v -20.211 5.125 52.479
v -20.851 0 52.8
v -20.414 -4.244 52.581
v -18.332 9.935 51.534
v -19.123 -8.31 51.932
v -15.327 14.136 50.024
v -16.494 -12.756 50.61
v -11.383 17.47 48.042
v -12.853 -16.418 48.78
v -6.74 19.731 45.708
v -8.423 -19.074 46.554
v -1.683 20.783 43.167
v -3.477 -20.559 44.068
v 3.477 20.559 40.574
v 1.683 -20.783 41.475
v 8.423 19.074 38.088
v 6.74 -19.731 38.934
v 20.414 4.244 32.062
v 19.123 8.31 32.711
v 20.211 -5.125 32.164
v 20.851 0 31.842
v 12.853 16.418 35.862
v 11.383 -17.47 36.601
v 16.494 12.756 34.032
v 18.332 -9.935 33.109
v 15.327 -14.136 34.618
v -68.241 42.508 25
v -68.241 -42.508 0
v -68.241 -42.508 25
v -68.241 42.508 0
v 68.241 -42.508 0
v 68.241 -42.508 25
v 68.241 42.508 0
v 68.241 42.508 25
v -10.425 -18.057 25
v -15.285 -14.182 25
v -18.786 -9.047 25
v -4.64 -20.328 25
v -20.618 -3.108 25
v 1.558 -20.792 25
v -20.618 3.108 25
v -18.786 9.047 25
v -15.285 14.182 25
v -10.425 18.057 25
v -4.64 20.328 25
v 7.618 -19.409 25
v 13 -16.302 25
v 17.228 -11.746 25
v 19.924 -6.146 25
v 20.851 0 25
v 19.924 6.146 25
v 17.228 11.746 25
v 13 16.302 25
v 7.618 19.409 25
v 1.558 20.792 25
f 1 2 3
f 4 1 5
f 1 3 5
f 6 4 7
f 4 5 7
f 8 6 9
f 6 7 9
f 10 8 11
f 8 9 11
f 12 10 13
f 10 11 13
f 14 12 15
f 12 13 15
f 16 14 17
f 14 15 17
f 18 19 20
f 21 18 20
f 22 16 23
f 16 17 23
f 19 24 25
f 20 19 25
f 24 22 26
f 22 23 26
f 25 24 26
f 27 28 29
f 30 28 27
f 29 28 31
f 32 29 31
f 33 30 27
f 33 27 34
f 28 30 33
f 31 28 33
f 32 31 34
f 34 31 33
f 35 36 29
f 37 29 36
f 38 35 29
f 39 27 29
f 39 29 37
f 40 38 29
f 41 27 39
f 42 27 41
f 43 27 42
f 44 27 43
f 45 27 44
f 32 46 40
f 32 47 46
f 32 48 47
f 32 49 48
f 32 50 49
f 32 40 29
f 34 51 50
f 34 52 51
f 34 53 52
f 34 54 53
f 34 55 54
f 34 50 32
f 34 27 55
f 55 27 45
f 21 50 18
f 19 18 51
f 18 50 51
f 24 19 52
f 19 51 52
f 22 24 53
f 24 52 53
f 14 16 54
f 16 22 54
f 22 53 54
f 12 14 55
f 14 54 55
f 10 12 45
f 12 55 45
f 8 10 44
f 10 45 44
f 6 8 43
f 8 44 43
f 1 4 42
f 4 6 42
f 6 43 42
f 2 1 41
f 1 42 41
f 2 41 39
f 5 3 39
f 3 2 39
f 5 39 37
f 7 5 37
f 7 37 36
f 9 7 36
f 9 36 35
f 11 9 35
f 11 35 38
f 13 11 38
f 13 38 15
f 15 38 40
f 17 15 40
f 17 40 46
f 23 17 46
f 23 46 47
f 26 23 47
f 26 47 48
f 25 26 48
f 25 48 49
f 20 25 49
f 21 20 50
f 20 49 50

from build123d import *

# Parameters (mm, degrees)
F0_W     = 136.481836
F0_H     = 85.016138
F0_R     = 20.850767
F1_DEPTH = 25
F2_DEPTH = 52.8
F4_DEPTH = 47.6


with BuildPart() as f1:
    # F0 (on Top) → F1 (new body)
    with BuildSketch(Plane.XY):
        Rectangle(F0_W, F0_H)
        Circle(F0_R, mode=Mode.SUBTRACT)
    extrude(amount=F1_DEPTH)

    # F0 (on Top) → F2 (join)
    with BuildSketch(Plane.XY):
        Circle(F0_R)
    extrude(amount=F2_DEPTH)

    # F3 (on Front) → F4 (cut, symmetric)
    with BuildSketch(Plane.XZ):
        Polygon((20.850767, 52.8), (-20.850767, 52.8), (20.850767, 31.842455), align=None)
    extrude(amount=F4_DEPTH, both=True, mode=Mode.SUBTRACT)


solid = f1.part
